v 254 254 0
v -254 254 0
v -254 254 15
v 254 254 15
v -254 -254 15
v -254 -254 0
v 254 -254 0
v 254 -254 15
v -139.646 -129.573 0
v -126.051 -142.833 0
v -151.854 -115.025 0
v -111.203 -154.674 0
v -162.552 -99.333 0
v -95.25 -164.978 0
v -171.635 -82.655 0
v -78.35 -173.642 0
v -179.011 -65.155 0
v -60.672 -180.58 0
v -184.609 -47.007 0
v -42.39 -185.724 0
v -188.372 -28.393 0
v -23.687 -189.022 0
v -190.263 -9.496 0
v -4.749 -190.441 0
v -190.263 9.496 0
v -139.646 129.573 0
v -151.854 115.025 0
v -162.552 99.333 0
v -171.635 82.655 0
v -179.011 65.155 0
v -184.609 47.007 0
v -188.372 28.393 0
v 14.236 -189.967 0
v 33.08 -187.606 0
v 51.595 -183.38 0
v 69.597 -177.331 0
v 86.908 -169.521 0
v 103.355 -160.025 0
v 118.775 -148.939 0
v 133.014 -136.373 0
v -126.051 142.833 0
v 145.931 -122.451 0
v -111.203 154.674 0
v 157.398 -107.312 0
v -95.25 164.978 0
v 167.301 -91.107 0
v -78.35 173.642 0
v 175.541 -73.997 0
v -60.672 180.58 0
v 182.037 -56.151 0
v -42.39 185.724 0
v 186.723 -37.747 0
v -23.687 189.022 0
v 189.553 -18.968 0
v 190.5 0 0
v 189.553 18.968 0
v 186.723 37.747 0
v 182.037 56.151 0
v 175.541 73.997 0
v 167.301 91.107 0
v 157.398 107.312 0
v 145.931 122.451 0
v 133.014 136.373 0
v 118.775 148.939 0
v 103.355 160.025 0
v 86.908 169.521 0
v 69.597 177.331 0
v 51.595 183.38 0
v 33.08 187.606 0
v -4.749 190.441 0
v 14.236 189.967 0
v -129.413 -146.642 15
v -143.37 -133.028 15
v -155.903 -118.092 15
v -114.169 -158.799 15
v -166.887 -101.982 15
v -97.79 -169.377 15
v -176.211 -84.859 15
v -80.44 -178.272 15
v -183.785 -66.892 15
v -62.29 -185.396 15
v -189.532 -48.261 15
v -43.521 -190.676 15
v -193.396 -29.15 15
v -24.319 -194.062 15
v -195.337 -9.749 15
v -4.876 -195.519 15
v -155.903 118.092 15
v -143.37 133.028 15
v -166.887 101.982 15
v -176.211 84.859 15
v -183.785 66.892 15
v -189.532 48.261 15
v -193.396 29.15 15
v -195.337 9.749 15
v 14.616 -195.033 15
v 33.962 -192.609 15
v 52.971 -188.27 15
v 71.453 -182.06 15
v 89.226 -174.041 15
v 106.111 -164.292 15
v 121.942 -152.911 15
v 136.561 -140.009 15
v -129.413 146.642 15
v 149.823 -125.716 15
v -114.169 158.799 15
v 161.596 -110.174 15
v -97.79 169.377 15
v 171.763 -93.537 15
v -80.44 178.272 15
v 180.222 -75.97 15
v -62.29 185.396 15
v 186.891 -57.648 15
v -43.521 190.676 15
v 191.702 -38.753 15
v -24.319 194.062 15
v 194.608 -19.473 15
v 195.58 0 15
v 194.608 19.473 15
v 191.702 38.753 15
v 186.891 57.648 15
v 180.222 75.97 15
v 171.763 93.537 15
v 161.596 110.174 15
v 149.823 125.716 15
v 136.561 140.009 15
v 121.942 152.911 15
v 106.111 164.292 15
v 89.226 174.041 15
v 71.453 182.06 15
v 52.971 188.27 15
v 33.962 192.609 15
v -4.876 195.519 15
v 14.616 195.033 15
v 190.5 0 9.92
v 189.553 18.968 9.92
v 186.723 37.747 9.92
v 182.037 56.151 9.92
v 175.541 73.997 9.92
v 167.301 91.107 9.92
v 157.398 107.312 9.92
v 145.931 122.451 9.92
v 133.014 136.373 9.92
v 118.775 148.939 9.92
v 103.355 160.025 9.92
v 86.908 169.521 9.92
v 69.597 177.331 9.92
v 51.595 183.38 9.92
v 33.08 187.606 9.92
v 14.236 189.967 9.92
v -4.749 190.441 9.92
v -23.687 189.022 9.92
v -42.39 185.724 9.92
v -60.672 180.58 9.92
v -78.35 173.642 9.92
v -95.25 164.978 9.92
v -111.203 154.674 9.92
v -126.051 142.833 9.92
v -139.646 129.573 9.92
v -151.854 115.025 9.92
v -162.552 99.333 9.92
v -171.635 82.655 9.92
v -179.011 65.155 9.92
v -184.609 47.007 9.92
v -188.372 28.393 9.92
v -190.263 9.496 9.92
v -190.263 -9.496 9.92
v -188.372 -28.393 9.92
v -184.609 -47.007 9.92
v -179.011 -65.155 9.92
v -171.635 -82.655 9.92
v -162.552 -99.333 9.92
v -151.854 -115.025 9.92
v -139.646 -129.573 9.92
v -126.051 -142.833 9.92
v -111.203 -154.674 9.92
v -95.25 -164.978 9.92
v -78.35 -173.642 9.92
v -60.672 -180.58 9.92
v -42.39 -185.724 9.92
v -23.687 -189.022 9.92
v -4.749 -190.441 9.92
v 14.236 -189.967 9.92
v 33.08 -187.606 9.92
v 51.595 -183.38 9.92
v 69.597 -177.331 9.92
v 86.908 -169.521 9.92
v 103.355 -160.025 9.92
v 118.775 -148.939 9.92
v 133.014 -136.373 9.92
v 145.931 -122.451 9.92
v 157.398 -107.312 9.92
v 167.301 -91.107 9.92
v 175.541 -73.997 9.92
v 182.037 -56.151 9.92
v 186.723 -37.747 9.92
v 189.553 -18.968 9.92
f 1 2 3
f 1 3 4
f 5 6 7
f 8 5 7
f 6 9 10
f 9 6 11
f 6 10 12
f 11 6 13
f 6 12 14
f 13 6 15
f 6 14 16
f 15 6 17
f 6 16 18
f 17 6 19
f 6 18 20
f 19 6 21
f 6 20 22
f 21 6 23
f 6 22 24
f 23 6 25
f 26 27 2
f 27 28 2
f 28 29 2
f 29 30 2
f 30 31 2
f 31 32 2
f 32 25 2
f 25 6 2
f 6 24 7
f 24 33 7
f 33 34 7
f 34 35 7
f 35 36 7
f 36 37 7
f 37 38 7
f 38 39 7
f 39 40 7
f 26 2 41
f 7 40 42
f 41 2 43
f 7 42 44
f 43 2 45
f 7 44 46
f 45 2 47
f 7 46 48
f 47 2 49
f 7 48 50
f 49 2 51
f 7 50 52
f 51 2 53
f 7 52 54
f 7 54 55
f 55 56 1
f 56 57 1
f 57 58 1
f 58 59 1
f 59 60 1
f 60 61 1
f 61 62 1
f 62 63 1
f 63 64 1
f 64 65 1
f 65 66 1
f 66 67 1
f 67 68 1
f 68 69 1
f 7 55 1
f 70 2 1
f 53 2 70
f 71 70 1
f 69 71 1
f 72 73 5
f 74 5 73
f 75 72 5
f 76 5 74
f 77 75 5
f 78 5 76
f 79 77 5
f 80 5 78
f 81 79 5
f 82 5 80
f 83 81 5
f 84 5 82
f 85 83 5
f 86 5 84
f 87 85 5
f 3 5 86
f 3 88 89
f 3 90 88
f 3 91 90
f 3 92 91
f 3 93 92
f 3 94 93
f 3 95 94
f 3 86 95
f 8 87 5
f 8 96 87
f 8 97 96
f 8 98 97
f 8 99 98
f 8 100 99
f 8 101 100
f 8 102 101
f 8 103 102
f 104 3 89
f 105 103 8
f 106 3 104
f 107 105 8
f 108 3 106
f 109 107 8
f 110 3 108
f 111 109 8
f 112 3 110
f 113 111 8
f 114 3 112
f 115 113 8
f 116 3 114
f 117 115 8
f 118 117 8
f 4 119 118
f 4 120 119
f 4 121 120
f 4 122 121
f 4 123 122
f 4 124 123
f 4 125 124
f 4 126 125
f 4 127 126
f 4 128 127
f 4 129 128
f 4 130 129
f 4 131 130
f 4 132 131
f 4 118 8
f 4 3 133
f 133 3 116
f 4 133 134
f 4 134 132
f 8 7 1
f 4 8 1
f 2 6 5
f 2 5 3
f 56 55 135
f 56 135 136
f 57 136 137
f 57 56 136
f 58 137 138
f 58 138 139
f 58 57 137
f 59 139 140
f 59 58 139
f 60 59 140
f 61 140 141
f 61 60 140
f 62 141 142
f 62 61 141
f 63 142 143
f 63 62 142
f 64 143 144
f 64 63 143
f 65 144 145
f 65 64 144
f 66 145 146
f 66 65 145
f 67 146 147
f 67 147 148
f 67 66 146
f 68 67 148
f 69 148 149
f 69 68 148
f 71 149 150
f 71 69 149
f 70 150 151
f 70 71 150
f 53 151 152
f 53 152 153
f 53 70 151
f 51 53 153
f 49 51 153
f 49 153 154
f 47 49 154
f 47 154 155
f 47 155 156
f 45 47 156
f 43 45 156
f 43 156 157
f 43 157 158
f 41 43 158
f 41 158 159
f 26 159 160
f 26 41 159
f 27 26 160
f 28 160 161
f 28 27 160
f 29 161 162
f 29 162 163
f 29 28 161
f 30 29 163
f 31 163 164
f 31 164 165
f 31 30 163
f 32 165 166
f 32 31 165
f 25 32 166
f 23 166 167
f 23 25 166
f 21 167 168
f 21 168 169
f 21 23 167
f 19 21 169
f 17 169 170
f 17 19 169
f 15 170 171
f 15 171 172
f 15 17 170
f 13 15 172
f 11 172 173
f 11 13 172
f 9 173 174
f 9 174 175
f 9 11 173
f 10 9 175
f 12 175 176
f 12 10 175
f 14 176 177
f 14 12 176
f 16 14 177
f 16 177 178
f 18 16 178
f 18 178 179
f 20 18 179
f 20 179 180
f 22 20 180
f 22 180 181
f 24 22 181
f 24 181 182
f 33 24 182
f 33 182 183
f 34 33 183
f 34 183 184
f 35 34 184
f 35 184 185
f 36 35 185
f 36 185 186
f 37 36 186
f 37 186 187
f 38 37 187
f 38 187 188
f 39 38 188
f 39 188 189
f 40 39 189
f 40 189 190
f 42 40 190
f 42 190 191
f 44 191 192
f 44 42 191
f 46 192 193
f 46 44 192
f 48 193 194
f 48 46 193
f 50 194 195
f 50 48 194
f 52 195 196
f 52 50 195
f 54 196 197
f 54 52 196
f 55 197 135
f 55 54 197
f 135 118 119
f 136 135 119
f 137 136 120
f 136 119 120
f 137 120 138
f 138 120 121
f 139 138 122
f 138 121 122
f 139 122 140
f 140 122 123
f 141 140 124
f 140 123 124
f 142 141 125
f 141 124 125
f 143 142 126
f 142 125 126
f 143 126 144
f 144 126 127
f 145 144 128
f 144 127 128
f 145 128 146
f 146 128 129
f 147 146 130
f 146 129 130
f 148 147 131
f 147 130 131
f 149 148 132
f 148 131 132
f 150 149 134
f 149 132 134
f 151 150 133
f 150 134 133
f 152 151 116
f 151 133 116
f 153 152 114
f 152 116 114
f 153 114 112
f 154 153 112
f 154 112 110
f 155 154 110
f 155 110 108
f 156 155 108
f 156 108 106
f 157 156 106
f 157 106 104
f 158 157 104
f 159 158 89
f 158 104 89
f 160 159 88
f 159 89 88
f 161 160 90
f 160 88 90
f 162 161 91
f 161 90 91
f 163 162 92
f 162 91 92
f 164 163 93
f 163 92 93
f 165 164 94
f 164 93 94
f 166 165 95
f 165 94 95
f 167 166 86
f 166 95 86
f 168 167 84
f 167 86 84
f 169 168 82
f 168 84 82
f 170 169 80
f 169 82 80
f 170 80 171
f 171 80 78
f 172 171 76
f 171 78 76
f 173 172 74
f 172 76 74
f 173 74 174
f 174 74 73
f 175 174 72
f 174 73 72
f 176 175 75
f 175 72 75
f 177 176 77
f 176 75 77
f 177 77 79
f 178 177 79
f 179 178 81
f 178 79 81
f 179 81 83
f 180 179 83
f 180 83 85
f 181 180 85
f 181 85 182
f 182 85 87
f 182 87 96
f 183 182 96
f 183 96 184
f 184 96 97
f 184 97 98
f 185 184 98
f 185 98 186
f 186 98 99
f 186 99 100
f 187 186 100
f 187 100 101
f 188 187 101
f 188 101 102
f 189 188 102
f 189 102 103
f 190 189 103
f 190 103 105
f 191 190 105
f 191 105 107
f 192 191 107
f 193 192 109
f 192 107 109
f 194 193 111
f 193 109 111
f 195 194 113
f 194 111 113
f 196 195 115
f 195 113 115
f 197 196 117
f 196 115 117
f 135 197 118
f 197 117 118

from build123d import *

# Parameters (mm, degrees)
F0_W     = 508
F0_H     = 508
F0_R     = 190.5
F1_DEPTH = 15
F2_SIZE  = 5.08


with BuildPart() as f1:
    # F0 (on Top) → F1 (new body)
    with BuildSketch(Plane.XY):
        Rectangle(F0_W, F0_H)
        Circle(F0_R, mode=Mode.SUBTRACT)
    extrude(amount=F1_DEPTH)

    # F2
    f2_edges = [f1.edges().sort_by_distance(p)[0] for p in [
        (-190.5, 0, 15),
    ]]
    chamfer(f2_edges, length=F2_SIZE)


solid = f1.part
